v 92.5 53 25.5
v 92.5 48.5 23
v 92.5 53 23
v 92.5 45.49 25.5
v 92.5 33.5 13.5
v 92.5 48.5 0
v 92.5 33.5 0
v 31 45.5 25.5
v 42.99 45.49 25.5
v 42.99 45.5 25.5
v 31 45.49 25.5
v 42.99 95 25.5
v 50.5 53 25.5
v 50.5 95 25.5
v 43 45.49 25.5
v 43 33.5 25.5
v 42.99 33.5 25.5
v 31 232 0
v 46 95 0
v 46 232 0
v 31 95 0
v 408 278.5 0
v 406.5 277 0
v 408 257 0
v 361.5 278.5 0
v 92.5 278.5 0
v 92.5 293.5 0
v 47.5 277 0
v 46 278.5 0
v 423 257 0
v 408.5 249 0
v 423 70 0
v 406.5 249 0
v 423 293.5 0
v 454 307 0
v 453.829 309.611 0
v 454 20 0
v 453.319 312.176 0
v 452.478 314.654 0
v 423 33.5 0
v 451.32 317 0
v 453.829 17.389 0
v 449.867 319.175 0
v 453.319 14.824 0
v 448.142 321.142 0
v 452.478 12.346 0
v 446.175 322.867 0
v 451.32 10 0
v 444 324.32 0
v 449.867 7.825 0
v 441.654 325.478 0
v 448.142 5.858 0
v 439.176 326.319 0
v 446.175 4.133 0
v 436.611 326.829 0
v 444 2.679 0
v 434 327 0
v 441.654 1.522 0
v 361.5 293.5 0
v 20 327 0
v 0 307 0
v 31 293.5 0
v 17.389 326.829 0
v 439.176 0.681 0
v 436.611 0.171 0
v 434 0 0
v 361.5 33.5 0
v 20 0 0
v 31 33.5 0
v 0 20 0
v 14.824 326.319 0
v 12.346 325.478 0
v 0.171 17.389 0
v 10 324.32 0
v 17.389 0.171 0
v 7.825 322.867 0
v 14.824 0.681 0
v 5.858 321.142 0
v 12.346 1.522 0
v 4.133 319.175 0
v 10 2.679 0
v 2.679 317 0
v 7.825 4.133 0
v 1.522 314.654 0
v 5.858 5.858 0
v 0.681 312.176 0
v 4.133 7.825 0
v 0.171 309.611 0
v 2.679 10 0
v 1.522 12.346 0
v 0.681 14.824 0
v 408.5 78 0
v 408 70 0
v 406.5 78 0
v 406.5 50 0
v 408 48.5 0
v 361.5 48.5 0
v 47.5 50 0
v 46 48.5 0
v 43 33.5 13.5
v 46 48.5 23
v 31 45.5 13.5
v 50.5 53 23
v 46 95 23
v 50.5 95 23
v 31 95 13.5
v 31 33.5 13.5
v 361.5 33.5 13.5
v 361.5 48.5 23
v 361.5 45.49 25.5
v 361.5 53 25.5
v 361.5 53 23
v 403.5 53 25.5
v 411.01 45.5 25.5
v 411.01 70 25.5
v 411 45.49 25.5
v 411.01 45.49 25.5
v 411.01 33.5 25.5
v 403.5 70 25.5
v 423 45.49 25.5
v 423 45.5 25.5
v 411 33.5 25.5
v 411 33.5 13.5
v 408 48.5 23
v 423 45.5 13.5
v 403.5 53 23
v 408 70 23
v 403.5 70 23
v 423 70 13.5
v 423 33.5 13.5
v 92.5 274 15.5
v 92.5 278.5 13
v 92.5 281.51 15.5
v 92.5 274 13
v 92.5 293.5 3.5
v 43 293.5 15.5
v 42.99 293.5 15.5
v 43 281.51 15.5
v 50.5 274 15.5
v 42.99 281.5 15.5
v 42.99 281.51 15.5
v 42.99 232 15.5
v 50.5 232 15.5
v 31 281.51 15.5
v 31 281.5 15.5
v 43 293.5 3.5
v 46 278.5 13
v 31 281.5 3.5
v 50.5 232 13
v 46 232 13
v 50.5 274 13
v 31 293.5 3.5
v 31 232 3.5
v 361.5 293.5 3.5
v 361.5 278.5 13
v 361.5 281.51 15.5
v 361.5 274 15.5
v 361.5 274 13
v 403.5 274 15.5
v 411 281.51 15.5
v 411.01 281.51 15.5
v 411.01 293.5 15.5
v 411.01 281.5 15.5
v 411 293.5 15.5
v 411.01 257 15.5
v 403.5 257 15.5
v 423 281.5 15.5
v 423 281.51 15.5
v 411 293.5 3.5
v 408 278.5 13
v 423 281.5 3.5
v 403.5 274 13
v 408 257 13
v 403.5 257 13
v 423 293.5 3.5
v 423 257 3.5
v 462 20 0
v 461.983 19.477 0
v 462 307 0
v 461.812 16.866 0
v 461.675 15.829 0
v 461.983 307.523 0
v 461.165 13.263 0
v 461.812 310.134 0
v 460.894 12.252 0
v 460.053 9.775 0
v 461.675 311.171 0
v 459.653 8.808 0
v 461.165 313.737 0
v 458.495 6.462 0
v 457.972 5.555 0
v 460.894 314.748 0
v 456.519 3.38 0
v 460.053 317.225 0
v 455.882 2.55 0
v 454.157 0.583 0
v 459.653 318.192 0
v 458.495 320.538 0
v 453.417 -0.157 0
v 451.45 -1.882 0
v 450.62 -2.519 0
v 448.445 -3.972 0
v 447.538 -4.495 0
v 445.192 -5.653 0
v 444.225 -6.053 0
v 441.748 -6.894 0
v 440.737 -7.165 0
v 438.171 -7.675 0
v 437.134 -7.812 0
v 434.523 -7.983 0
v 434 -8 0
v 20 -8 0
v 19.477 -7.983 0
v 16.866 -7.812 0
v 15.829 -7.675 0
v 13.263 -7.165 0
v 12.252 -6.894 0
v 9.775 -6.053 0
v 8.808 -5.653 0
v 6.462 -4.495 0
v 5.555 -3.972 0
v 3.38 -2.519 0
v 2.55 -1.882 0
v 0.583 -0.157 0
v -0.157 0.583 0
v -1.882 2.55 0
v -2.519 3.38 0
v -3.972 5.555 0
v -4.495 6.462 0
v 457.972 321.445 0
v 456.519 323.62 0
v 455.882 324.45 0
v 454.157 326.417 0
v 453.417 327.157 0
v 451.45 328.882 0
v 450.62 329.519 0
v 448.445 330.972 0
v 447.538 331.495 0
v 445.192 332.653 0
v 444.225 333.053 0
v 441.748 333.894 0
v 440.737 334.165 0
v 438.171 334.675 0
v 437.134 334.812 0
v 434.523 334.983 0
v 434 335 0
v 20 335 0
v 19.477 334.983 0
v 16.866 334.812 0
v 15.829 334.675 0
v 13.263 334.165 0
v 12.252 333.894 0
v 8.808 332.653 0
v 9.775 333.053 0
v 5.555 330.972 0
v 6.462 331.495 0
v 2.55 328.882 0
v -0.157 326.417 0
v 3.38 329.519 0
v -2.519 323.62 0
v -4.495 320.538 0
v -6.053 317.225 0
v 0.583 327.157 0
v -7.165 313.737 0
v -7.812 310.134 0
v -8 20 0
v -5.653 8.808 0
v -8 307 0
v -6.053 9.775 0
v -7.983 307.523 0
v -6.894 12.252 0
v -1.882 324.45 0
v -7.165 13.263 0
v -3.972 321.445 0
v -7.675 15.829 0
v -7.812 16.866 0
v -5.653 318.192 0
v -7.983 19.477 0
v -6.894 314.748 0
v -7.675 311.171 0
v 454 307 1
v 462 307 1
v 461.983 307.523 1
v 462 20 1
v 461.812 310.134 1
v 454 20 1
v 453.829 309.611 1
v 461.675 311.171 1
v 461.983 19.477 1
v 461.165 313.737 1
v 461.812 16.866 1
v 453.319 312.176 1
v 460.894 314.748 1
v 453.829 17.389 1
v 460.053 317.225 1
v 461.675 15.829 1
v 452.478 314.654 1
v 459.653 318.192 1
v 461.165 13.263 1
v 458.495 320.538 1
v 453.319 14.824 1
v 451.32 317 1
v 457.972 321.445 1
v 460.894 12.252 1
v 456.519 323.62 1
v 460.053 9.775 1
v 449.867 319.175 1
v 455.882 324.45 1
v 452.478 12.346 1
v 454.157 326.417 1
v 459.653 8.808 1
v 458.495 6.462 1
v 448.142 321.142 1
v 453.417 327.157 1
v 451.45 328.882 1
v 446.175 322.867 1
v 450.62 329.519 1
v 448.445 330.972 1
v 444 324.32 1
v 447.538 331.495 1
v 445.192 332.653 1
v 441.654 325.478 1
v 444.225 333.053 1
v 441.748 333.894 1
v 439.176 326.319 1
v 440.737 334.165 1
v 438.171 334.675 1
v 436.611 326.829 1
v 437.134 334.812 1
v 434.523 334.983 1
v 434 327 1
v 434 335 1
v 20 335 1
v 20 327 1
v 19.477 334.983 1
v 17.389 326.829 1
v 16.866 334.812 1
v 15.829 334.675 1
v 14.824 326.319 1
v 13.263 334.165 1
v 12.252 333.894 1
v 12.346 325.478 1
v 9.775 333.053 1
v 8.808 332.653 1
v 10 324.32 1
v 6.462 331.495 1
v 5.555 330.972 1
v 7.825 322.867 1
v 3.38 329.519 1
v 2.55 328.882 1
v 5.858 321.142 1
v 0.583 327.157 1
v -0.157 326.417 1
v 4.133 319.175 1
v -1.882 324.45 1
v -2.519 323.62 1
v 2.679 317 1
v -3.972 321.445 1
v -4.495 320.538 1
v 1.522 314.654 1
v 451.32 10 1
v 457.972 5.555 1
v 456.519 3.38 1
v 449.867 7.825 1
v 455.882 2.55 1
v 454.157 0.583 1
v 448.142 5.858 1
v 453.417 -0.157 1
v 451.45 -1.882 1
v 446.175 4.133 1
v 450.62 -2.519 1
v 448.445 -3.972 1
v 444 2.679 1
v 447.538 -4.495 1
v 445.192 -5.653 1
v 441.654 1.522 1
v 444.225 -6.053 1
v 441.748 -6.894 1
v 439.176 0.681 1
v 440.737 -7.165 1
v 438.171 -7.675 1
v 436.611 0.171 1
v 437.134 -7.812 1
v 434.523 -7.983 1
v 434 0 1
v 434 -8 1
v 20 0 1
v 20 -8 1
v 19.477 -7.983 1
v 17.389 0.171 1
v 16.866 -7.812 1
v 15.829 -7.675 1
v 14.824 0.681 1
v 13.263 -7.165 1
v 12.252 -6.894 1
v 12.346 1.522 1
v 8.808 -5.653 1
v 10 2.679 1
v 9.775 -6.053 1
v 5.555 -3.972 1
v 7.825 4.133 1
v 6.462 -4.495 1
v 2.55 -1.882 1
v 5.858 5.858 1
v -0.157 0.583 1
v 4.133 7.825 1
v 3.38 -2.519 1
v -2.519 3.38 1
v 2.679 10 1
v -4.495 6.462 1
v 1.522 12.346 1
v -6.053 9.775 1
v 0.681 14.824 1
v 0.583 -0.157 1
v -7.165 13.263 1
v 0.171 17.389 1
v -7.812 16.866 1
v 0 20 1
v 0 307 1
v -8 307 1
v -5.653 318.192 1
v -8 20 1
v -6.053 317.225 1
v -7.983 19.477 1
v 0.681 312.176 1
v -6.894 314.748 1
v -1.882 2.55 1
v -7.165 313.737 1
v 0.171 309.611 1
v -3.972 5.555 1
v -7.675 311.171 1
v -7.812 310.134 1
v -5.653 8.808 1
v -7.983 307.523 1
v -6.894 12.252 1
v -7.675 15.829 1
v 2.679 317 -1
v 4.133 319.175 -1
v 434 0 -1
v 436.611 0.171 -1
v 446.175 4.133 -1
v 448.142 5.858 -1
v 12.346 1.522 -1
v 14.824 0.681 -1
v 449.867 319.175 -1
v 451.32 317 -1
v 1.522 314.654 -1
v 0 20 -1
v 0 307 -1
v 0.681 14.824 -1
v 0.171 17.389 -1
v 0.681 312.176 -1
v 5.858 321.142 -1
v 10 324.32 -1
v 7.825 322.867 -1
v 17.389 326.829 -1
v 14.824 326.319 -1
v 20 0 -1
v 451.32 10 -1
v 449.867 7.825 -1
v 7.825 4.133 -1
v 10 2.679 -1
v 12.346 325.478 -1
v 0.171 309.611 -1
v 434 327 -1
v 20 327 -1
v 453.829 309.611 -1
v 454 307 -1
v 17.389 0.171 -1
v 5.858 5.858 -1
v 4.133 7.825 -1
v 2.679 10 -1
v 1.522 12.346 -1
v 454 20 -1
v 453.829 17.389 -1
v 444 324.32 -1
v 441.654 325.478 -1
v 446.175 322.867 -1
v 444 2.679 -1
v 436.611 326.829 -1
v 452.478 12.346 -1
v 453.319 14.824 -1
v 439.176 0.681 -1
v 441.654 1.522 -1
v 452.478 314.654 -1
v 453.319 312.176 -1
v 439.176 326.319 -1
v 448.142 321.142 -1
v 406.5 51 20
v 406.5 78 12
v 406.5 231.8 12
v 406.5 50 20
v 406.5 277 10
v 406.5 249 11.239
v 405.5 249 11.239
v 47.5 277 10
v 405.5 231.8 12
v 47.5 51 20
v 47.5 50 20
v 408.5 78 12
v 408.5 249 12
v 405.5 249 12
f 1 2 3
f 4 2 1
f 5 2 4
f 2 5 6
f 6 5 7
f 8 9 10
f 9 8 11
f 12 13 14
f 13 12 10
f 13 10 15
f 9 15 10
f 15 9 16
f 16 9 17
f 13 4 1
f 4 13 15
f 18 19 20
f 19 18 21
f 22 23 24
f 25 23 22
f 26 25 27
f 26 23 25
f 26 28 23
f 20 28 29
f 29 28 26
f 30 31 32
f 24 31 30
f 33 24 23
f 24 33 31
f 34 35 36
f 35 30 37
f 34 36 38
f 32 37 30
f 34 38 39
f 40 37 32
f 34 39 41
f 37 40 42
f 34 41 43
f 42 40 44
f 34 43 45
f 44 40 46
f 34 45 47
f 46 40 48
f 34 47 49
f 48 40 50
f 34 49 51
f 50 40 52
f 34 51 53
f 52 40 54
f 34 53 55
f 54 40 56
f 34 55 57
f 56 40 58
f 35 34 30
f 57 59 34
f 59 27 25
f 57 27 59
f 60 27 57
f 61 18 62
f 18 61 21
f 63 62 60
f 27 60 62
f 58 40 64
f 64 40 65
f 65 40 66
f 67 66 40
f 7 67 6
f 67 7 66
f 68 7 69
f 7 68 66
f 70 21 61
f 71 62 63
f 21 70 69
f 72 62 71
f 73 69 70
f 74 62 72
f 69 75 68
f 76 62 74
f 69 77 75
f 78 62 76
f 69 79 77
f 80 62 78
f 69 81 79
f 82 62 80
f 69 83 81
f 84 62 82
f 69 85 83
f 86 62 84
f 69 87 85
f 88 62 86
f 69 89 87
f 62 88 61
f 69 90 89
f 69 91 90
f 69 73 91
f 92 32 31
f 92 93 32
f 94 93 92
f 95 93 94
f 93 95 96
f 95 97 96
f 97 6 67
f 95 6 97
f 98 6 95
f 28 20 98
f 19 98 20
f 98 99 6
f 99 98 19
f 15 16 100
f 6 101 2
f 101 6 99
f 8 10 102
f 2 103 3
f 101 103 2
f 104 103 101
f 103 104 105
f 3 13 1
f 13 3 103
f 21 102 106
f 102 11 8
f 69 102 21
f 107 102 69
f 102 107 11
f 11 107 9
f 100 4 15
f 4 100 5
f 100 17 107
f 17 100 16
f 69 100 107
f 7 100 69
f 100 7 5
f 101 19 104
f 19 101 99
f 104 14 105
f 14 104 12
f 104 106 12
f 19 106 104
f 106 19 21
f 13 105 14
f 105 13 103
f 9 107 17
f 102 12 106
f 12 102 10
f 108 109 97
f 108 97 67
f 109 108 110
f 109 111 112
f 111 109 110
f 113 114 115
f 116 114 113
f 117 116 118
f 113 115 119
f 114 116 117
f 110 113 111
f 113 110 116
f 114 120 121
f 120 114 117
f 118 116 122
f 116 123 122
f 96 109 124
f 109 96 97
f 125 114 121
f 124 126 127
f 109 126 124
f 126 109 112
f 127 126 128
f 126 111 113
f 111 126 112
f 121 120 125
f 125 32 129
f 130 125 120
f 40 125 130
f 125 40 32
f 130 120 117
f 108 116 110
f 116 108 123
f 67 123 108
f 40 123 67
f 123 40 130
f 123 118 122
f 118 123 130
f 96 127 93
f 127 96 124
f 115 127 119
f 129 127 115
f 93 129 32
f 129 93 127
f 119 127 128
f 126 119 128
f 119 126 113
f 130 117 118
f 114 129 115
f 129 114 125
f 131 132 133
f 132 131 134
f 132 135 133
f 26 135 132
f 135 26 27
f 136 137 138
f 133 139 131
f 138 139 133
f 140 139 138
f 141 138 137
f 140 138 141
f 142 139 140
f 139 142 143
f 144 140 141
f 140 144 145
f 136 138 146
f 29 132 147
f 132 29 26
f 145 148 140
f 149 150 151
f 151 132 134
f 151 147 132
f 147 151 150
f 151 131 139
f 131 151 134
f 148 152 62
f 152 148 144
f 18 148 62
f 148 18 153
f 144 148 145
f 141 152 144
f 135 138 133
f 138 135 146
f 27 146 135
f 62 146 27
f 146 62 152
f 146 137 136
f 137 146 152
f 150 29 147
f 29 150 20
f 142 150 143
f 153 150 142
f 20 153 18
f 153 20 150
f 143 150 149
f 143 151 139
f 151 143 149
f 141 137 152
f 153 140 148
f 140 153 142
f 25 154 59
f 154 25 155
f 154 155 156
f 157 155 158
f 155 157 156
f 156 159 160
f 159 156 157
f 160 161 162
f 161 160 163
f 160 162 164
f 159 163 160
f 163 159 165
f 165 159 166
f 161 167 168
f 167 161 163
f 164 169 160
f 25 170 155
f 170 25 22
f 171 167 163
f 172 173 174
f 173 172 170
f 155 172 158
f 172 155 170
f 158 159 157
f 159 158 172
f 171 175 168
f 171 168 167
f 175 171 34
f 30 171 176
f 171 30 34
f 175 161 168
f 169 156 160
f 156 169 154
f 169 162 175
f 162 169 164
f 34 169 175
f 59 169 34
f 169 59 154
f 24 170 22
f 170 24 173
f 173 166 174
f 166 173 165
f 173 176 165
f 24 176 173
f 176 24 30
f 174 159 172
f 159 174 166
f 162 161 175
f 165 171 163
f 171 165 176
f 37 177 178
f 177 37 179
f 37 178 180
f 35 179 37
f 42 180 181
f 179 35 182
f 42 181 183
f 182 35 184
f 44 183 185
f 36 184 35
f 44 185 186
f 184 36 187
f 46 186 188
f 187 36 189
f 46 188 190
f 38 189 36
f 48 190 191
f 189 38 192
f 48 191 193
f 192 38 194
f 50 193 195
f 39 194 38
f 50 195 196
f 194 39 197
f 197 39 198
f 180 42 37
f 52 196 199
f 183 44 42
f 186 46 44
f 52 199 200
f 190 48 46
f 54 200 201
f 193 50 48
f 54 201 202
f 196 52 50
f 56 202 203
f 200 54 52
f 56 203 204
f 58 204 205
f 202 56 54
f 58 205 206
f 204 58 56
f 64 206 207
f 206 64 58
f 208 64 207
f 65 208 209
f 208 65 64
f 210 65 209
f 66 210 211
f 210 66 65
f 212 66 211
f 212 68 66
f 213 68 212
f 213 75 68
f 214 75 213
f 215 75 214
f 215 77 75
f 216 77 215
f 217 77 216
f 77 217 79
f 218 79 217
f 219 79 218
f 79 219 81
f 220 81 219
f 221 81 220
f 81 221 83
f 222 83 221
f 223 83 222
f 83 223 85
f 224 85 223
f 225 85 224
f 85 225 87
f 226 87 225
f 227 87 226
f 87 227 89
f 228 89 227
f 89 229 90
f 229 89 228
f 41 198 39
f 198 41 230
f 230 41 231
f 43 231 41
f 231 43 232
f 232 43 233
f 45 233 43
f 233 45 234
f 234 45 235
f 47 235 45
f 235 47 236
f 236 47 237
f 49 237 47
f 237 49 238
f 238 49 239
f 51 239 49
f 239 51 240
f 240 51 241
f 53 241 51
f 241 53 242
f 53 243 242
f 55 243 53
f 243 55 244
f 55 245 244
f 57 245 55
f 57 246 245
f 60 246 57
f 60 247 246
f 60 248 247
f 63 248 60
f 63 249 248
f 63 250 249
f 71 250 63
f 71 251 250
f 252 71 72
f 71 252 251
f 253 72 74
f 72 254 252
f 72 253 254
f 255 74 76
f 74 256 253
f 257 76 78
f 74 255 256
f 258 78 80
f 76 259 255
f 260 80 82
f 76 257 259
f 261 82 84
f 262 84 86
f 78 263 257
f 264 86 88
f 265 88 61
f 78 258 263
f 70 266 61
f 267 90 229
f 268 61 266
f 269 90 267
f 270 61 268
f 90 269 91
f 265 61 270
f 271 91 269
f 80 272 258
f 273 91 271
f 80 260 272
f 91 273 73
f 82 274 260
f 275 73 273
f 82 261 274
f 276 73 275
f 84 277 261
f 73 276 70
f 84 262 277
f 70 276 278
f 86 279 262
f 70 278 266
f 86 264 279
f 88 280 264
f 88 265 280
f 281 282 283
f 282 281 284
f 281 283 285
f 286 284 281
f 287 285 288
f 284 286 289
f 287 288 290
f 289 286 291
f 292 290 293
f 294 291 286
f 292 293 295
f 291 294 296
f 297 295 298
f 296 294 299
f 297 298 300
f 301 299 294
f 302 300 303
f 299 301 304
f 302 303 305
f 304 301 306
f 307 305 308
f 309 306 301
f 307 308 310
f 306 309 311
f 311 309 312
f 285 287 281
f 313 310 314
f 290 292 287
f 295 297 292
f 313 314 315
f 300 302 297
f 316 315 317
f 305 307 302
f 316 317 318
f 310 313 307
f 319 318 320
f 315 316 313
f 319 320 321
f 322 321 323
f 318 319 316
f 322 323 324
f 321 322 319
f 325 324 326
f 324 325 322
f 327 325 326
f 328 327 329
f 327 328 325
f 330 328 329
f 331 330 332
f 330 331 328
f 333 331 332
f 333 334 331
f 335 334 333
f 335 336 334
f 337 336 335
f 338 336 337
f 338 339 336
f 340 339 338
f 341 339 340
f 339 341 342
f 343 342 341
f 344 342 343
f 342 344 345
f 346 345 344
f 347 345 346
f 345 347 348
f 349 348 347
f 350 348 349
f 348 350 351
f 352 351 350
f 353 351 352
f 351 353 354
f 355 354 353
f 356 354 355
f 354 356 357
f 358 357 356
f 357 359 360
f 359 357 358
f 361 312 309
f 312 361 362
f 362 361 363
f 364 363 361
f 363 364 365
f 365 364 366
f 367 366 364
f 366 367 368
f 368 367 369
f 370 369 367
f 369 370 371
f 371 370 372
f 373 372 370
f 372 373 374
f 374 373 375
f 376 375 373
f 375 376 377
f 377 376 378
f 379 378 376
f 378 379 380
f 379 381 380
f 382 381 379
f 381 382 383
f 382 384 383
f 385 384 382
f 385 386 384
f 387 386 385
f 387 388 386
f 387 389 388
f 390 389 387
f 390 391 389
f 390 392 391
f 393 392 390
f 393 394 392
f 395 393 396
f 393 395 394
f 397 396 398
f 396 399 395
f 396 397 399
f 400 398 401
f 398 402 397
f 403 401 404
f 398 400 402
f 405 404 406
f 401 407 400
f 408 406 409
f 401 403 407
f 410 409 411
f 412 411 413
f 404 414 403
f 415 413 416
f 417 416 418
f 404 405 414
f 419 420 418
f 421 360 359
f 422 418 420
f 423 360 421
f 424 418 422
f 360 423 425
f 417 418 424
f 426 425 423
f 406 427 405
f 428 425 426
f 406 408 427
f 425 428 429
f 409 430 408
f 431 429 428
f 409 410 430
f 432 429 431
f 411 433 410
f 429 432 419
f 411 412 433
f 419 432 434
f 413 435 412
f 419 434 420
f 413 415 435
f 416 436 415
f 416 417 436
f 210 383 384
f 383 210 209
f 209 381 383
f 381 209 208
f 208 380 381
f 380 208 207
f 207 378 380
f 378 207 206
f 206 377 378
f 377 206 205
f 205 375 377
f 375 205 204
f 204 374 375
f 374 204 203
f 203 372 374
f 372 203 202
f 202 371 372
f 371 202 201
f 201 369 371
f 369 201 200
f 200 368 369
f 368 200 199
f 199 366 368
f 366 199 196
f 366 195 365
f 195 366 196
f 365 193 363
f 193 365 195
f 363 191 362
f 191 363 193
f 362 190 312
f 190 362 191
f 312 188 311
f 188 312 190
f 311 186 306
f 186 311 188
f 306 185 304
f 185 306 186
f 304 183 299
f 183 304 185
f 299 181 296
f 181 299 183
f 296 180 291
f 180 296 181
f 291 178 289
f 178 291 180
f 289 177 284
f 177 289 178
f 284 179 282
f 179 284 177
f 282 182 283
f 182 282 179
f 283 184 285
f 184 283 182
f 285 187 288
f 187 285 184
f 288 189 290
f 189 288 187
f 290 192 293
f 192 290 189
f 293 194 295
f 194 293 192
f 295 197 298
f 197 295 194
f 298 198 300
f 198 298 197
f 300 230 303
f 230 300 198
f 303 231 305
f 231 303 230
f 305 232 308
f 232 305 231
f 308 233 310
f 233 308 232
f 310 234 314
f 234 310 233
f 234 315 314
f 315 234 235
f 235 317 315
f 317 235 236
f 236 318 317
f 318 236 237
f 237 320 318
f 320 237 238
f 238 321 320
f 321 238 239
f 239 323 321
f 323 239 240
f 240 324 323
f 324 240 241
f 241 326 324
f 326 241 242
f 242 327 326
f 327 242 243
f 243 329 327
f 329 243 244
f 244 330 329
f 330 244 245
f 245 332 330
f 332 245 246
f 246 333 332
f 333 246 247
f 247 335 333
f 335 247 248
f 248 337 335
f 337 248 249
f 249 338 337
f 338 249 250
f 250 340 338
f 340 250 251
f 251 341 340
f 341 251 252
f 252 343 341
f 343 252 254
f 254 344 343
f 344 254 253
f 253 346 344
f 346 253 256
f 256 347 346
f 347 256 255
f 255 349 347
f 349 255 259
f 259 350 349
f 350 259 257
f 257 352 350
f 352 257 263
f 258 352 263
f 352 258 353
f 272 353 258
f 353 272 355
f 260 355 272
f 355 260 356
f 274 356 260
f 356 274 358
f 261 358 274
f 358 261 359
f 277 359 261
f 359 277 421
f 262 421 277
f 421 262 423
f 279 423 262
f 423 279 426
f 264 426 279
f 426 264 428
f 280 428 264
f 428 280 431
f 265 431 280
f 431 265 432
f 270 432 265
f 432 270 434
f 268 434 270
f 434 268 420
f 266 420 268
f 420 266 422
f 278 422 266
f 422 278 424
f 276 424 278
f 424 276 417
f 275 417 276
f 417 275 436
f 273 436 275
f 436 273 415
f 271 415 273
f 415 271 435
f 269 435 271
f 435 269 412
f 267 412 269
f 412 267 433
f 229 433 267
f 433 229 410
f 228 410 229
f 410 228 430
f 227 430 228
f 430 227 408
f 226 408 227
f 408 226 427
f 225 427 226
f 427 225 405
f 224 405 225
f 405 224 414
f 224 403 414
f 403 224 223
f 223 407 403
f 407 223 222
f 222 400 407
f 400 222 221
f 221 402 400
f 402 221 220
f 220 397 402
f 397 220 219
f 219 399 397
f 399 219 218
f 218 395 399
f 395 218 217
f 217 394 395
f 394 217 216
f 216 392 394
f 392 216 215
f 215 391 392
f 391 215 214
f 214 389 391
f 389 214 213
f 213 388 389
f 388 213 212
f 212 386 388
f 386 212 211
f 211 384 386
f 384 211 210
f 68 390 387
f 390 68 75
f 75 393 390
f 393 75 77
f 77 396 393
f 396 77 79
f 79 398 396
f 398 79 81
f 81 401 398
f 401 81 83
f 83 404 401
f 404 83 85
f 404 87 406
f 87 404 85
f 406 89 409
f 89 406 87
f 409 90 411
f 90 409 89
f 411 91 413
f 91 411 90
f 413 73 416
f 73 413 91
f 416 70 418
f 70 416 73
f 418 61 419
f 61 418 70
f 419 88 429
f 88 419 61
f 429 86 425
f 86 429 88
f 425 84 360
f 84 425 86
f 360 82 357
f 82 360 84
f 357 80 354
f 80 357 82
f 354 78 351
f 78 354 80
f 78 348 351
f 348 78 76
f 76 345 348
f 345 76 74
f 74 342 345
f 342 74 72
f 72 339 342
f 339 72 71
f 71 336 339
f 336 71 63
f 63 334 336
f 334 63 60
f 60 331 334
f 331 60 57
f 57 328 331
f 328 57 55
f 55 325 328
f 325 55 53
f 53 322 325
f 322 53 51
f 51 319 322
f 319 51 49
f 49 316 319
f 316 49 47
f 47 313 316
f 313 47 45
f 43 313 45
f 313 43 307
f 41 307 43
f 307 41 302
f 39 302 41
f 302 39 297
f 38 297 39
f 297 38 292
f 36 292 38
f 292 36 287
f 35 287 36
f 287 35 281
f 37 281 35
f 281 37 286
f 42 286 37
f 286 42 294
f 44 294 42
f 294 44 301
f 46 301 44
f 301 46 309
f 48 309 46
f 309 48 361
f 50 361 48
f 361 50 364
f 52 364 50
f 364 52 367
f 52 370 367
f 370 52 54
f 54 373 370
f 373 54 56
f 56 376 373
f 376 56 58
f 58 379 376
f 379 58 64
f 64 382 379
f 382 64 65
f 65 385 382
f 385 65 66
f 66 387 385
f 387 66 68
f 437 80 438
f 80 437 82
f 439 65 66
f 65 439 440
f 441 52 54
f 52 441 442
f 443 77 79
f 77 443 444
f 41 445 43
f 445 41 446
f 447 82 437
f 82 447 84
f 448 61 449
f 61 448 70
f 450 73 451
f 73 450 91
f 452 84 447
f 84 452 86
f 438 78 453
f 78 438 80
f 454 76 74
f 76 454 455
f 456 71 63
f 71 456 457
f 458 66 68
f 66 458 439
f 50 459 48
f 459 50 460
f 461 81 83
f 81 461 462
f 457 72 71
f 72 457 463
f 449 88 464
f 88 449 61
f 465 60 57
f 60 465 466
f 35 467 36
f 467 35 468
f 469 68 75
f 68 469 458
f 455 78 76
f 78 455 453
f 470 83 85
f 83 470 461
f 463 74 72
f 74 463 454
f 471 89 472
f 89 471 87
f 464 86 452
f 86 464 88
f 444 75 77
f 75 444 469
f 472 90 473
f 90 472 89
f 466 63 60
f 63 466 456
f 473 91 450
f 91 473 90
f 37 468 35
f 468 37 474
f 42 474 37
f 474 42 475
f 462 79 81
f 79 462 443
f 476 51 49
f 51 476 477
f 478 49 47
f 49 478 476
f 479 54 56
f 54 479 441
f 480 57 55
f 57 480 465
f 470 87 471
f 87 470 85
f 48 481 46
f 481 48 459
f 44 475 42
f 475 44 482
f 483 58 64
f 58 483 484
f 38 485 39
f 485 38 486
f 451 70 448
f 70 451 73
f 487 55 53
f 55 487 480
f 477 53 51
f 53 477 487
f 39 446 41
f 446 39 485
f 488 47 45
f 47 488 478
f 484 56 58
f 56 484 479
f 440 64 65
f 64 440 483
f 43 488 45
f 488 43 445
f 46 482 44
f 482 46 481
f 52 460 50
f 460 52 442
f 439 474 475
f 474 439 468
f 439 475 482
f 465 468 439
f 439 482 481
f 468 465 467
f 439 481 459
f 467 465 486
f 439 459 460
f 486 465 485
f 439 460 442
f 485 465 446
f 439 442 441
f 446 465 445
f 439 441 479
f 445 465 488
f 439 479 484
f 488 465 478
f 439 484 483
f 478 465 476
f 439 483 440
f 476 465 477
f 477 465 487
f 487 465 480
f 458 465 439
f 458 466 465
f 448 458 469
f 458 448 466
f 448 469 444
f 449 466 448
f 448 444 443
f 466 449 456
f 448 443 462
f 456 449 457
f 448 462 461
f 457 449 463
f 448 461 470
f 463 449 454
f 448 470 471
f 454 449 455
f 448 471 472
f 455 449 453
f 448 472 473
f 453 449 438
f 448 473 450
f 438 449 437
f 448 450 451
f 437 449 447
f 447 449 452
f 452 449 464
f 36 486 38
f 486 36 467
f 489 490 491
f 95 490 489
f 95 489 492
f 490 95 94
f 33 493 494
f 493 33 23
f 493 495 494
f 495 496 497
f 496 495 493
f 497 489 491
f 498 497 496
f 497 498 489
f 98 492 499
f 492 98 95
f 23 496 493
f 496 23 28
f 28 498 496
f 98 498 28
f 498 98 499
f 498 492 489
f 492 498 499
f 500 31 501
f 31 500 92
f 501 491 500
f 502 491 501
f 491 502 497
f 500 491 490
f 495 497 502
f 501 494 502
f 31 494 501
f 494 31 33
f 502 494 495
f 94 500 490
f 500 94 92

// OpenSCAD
// file: params.scad
// ===========================================================================
//  Apache 4800 cyberdeck v2 - shared parameters (all mm)
//  Every part file includes this through parts.scad.
//  Values marked [CHECK] are defaults from the spec: measure the real part and
//  change them here, then run build.cmd again to re-export every STL.
// ===========================================================================

// ---- printer limits --------------------------------------------------------
bed_max    = 175;      // max footprint X and Y
height_max = 150;

// ---- case: Harbor Freight Apache 4800 ---------------------------------------
case_in      = [454, 327];  // interior at the rim (listed)
tray         = [444, 312];  // [CHECK] printed tray outline = floor at the very bottom
tray_r       = 20;          // [CHECK] inside corner radius
base_depth   = 115;         // [CHECK] floor to rim
lid_depth    = 44;          // [CHECK]
height_limit = 100;         // nothing in the base taller than this above the floor

// ---- floor tiles (3 x 2) -----------------------------------------------------
tile_cols = 3;
tile_rows = 2;
tile_t    = 4;
tile_gap  = 0.4;                       // total gap between neighbouring tiles
tile_sz   = [tray[0] / tile_cols, tray[1] / tile_rows];   // 148 x 156
vent_sz     = 15;
vent_pitch  = 25;
vent_margin = 8;                       // keep vents this far from tile edges
chamfer     = 0.5;                     // bottom-edge chamfer (elephant foot)

// ---- tile joints (dovetail tabs printed on the tiles - no loose keys) -------
tab_neck  = 10;      // width where the tab leaves its tile
tab_head  = 16;      // width at the tip (wider = locks)
tab_len   = 10;      // how far it reaches into the next tile
tab_clear = 0.2;     // gap around the tab in the socket (per side); raise if too tight

// ---- Velcro straps ------------------------------------------------------------
strap_w      = 22;   // slot length (20 mm strap + room)
strap_slot_t = 3.5;  // slot width
strap_groove = 1.6;  // groove depth under a floor for the strap (leaves >= 2.4 mm of floor)

// ---- layout (top view; origin = front-left of tray, X right, Y to hinge) ----
// [x0, y0, x1, y1]
hub_box    = [75,   6, 245,  56];
pi_box     = [75,  60, 245, 138];
power_box  = [75, 142, 245, 282];
switch_box = [2.5, 12.5, 72.5, 117.5];
signal_lane = [0, 286, tray[0], 298];
power_lane  = [0, 300, tray[0], 312];

// ---- the PC: Minisforum UM870 Slim (names still say k12 so nothing else breaks) ----
k12      = [130, 126.5, 50.4];    // listed (was GMKtec K12: 154 x 151 x 73.6)
k12_pos  = [266, 40];             // front-left corner on the tray (same spot as the K12)
// [CHECK] open air behind the PC: assumes it blows hot air out the back.
// Once the UM870 is here, check where its vents really are.
rear_air = [k12_pos[0], k12_pos[1] + k12[1], 420, 286];
plinth_margin = 8;
plinth_h      = 15;
plinth_rim    = 8;                // solid border: corner guides sit fully on it
hex_cell      = 10;               // across flats
hex_wall      = 2;
plinth_post_front_h = 20;         // above the honeycomb
plinth_post_rear_h  = 10;         // keep the rear exhaust clear (spec: <= 10)
plinth_post_leg     = 15;
plinth_post_t       = 3;
k12_clear           = 1;
plinth_box = [k12_pos[0] - plinth_margin, k12_pos[1] - plinth_margin,
              k12_pos[0] + k12[0] + plinth_margin, k12_pos[1] + k12[1] + plinth_margin];

// ---- USB hub (Vantisan) -----------------------------------------------------------
hub      = [161, 42, 25];        // measured
hub_fit  = 1;                    // clearance (total)
hub_wall_h       = 16;           // back/side walls above the floor
hub_front_wall_h = 8;            // [CHECK] low front wall: ports face up/front
hub_floor        = 4;
hub_cable_end    = "right";      // cable exit notch end: "right" (toward the PC) or "left"

// ---- Raspberry Pi 5 in CanaKit case ------------------------------------------------
pi_case   = [95, 65, 30];        // measured (height est.)
pi_fit    = 1;
pi_floor  = 4;
pi_guide_h  = 12;
pi_vent_gap = 15;                // open space between Pi and the cable cubby
cubby_wall_h = 15;

// ---- power bay ------------------------------------------------------------------
brick  = [150, 65, 35];          // [CHECK] PC 120 W brick (UM870: 19 V / 6.32 A) - measure it
strip  = [130, 60, 40];          // [CHECK] compact 3-outlet surge strip
power_floor  = 4;
power_wall_h = 30;               // above the floor
power_wall_t = 3;
brick_rib_h  = 4;                // air gap under the brick

// ---- network switch -----------------------------------------------------------------
switch_sz   = [65, 100, 25];     // [CHECK] (X = width, Y = length, ports at back)
switch_fit  = 1;
switch_floor  = 4;
switch_wall_h = 12;

// ---- cable lanes ---------------------------------------------------------------------
rib_h      = 10;
rib_t      = 2.4;
rib_foot_w = 8;
rib_foot_t = 2;
rib_y      = 299;                // centre line between the lanes
comb_w     = 20;                 // comb thickness along the lane

// ---- left-wall side panel -------------------------------------------------------------
panel      = [150, 60];
panel_outer_t = 4;
panel_inner_t = 3;
wall_cutout   = [135, 42];       // [CHECK] must sit inside the flat area of the wall
panel_y_center = 215;            // along the case wall (tray Y)
keystone_hole  = [14.5, 16.0];   // print keystone_test.stl first and adjust
keystone_relief = [17.5, 24];    // back-side pocket so the latch sees a thin plate
keystone_latch_t = 2.0;          // plate thickness where the keystone clips on
keystone_pitch = 19.5;
// Power entry: "iec" = snap-in C14 inlet (recommended - see README) or "slot" = cord slot
power_entry  = "iec";
iec_hole     = [27.5, 19.8];     // [CHECK] snap-in C14 inlet cutout
iec_relief   = [31, 24];
iec_latch_t  = 2.0;
cord_slot    = [25, 12];
m4_hole      = 4.3;
labels = ["LAN", "PC", "MIC", "AUD", "USB", "PWR"];
cover_clear  = 9;                // room in front of the plate for couplers/bolt heads

// ---- lid monitor clips (ViewSonic VA1655) ------------------------------------------------
monitor     = [359, 227];        // listed (spec value used; re-measure the width)
mon_thick   = 20;                // thick edge (measured)
mon_thin    = 10;                // thin edge (measured)
thick_edge  = "bottom";          // [CHECK] "bottom" = hinge side when the lid is open
foam_t      = 1.5;               // foam on every face touching the monitor
clip_wall_t = 3;
clip_lip    = 3;                 // overlap onto the bezel only
clip_lip_t  = 2.5;
clip_buttress = 12;              // VHB foot width outside the wall
clip_leg    = 45;                // leg length along the monitor edge, from the corner
clip_port_leg = 20;              // [CHECK] shorter leg along the RIGHT edge (port zone)

// ---- print settings reference (set these in the slicer) ---------------------------------
// 0.4 nozzle, 0.2 layers, 4 walls, 25-30% gyroid
// holes already include +0.3 mm
$fn = 48;
// main file
// Lid preview: monitor + 4 clips inside the lid, seen from where you sit.
// Bottom of the picture = hinge side. Grey = monitor, blue = clips.
include <parts.scad>

ox = (case_in[0] - monitor[0]) / 2;
oy = (case_in[1] - monitor[1]) / 2;

color([0.15, 0.15, 0.17]) linear_extrude(1) difference() { offset(r = 8) rrect(case_in, tray_r); rrect(case_in, tray_r); }
color([0.35, 0.35, 0.4]) translate([0, 0, -1]) linear_extrude(1) rrect(case_in, tray_r);
// monitor (wedge: thick edge at the bottom by default)
color([0.55, 0.55, 0.6, 0.85]) translate([ox, oy, 0])
    hull() {
        cube([monitor[0], 1, thick_edge == "bottom" ? mon_thick : mon_thin]);
        translate([0, monitor[1] - 1, 0]) cube([monitor[0], 1, thick_edge == "bottom" ? mon_thin : mon_thick]);
    }
// port zone on the right edge (keep clear)
color([1, 0.35, 0.3]) translate([ox + monitor[0] - 1, oy + clip_port_leg + 8, 0]) cube([3, monitor[1] - 2 * (clip_port_leg + 8), 12]);
color([0.16, 0.62, 0.85]) {
    translate([ox, oy, 0]) lid_clip_placed("BL");
    translate([ox + monitor[0], oy, 0]) lid_clip_placed("BR");
    translate([ox, oy + monitor[1], 0]) lid_clip_placed("TL");
    translate([ox + monitor[0], oy + monitor[1], 0]) lid_clip_placed("TR");
}
